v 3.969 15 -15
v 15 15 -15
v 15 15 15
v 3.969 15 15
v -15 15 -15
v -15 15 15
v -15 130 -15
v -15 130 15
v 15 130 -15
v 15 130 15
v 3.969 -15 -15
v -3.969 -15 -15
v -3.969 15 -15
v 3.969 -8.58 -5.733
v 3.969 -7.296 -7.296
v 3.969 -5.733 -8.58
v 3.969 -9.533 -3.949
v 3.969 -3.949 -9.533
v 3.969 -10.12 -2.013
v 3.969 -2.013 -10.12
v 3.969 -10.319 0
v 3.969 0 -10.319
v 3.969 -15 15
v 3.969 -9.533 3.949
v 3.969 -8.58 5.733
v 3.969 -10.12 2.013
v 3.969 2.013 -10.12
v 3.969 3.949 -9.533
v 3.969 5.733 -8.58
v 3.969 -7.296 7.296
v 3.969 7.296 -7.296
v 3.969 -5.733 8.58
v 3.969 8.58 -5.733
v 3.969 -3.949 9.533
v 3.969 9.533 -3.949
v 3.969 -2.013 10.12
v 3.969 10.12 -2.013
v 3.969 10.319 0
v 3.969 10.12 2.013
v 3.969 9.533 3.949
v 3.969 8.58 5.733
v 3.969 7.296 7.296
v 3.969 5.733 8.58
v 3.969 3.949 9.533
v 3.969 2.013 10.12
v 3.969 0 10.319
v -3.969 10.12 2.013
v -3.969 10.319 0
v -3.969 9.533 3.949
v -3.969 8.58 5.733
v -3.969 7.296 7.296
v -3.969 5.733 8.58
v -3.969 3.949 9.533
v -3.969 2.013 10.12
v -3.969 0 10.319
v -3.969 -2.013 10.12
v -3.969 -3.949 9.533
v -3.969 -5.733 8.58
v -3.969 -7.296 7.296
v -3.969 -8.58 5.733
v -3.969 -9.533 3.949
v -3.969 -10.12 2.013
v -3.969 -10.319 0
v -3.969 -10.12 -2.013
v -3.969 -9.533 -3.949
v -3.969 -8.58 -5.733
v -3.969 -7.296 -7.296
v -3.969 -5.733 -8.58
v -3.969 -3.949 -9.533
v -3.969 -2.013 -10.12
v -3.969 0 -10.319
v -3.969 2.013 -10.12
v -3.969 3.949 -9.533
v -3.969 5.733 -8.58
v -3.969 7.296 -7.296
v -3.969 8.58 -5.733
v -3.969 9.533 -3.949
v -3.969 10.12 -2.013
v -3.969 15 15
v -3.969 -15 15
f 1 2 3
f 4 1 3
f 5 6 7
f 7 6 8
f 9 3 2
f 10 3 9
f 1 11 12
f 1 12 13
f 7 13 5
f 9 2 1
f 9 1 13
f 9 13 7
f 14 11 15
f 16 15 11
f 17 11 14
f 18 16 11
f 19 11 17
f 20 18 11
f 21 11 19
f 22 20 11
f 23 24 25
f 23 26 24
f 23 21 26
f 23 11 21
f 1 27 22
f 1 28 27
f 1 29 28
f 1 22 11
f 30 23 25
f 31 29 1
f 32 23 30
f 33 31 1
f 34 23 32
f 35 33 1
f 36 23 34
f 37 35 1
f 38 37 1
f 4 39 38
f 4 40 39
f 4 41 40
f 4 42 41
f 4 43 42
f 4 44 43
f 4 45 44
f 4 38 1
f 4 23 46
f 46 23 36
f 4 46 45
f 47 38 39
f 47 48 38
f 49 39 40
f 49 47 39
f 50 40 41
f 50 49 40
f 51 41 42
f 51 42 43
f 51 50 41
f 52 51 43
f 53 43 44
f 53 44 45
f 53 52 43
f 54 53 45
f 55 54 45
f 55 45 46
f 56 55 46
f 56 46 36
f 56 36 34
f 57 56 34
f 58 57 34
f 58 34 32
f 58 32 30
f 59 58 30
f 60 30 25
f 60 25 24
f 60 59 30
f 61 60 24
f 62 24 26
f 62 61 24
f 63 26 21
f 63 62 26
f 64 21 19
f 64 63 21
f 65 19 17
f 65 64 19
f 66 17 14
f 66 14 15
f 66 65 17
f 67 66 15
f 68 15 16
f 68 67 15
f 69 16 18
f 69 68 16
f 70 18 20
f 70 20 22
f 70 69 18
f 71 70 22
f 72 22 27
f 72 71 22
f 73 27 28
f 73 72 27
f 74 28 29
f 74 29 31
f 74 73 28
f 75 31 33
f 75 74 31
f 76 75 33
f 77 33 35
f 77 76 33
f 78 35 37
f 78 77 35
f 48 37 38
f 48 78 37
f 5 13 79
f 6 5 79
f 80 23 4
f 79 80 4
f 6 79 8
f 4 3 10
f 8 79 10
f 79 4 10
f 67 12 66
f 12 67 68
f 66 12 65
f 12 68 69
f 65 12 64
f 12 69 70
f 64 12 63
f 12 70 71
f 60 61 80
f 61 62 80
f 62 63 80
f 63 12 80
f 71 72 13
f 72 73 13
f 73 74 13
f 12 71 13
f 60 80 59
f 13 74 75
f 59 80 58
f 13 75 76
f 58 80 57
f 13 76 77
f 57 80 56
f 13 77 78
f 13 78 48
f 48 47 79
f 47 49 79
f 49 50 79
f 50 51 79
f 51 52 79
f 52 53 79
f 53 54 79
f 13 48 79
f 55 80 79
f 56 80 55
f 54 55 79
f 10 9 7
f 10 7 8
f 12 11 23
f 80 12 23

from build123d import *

# Parameters (mm, degrees)
F0_W     = 30
F0_H     = 30
F0_R     = 10.31875
F1_DEPTH = 3.96875
F0_W_2   = 115
F2_DEPTH = 15


# Not quite as in the source:
# - a length typed as a fraction of an inch, garbled in the dataset ("3 / 203.2 mm" for 3/8 in), is restored


with BuildPart() as f1:
    # F0 (on Right) → F1 (new body, symmetric)
    with BuildSketch(Plane.YZ):
        Rectangle(F0_W, F0_H)
        Circle(F0_R, mode=Mode.SUBTRACT)
    extrude(amount=F1_DEPTH, both=True)

    # F0 (on Right) → F2 (join, symmetric)
    with BuildSketch(Plane.YZ):
        with Locations((72.5, 0)):
            Rectangle(F0_W_2, F0_H)
    extrude(amount=F2_DEPTH, both=True)


solid = f1.part
